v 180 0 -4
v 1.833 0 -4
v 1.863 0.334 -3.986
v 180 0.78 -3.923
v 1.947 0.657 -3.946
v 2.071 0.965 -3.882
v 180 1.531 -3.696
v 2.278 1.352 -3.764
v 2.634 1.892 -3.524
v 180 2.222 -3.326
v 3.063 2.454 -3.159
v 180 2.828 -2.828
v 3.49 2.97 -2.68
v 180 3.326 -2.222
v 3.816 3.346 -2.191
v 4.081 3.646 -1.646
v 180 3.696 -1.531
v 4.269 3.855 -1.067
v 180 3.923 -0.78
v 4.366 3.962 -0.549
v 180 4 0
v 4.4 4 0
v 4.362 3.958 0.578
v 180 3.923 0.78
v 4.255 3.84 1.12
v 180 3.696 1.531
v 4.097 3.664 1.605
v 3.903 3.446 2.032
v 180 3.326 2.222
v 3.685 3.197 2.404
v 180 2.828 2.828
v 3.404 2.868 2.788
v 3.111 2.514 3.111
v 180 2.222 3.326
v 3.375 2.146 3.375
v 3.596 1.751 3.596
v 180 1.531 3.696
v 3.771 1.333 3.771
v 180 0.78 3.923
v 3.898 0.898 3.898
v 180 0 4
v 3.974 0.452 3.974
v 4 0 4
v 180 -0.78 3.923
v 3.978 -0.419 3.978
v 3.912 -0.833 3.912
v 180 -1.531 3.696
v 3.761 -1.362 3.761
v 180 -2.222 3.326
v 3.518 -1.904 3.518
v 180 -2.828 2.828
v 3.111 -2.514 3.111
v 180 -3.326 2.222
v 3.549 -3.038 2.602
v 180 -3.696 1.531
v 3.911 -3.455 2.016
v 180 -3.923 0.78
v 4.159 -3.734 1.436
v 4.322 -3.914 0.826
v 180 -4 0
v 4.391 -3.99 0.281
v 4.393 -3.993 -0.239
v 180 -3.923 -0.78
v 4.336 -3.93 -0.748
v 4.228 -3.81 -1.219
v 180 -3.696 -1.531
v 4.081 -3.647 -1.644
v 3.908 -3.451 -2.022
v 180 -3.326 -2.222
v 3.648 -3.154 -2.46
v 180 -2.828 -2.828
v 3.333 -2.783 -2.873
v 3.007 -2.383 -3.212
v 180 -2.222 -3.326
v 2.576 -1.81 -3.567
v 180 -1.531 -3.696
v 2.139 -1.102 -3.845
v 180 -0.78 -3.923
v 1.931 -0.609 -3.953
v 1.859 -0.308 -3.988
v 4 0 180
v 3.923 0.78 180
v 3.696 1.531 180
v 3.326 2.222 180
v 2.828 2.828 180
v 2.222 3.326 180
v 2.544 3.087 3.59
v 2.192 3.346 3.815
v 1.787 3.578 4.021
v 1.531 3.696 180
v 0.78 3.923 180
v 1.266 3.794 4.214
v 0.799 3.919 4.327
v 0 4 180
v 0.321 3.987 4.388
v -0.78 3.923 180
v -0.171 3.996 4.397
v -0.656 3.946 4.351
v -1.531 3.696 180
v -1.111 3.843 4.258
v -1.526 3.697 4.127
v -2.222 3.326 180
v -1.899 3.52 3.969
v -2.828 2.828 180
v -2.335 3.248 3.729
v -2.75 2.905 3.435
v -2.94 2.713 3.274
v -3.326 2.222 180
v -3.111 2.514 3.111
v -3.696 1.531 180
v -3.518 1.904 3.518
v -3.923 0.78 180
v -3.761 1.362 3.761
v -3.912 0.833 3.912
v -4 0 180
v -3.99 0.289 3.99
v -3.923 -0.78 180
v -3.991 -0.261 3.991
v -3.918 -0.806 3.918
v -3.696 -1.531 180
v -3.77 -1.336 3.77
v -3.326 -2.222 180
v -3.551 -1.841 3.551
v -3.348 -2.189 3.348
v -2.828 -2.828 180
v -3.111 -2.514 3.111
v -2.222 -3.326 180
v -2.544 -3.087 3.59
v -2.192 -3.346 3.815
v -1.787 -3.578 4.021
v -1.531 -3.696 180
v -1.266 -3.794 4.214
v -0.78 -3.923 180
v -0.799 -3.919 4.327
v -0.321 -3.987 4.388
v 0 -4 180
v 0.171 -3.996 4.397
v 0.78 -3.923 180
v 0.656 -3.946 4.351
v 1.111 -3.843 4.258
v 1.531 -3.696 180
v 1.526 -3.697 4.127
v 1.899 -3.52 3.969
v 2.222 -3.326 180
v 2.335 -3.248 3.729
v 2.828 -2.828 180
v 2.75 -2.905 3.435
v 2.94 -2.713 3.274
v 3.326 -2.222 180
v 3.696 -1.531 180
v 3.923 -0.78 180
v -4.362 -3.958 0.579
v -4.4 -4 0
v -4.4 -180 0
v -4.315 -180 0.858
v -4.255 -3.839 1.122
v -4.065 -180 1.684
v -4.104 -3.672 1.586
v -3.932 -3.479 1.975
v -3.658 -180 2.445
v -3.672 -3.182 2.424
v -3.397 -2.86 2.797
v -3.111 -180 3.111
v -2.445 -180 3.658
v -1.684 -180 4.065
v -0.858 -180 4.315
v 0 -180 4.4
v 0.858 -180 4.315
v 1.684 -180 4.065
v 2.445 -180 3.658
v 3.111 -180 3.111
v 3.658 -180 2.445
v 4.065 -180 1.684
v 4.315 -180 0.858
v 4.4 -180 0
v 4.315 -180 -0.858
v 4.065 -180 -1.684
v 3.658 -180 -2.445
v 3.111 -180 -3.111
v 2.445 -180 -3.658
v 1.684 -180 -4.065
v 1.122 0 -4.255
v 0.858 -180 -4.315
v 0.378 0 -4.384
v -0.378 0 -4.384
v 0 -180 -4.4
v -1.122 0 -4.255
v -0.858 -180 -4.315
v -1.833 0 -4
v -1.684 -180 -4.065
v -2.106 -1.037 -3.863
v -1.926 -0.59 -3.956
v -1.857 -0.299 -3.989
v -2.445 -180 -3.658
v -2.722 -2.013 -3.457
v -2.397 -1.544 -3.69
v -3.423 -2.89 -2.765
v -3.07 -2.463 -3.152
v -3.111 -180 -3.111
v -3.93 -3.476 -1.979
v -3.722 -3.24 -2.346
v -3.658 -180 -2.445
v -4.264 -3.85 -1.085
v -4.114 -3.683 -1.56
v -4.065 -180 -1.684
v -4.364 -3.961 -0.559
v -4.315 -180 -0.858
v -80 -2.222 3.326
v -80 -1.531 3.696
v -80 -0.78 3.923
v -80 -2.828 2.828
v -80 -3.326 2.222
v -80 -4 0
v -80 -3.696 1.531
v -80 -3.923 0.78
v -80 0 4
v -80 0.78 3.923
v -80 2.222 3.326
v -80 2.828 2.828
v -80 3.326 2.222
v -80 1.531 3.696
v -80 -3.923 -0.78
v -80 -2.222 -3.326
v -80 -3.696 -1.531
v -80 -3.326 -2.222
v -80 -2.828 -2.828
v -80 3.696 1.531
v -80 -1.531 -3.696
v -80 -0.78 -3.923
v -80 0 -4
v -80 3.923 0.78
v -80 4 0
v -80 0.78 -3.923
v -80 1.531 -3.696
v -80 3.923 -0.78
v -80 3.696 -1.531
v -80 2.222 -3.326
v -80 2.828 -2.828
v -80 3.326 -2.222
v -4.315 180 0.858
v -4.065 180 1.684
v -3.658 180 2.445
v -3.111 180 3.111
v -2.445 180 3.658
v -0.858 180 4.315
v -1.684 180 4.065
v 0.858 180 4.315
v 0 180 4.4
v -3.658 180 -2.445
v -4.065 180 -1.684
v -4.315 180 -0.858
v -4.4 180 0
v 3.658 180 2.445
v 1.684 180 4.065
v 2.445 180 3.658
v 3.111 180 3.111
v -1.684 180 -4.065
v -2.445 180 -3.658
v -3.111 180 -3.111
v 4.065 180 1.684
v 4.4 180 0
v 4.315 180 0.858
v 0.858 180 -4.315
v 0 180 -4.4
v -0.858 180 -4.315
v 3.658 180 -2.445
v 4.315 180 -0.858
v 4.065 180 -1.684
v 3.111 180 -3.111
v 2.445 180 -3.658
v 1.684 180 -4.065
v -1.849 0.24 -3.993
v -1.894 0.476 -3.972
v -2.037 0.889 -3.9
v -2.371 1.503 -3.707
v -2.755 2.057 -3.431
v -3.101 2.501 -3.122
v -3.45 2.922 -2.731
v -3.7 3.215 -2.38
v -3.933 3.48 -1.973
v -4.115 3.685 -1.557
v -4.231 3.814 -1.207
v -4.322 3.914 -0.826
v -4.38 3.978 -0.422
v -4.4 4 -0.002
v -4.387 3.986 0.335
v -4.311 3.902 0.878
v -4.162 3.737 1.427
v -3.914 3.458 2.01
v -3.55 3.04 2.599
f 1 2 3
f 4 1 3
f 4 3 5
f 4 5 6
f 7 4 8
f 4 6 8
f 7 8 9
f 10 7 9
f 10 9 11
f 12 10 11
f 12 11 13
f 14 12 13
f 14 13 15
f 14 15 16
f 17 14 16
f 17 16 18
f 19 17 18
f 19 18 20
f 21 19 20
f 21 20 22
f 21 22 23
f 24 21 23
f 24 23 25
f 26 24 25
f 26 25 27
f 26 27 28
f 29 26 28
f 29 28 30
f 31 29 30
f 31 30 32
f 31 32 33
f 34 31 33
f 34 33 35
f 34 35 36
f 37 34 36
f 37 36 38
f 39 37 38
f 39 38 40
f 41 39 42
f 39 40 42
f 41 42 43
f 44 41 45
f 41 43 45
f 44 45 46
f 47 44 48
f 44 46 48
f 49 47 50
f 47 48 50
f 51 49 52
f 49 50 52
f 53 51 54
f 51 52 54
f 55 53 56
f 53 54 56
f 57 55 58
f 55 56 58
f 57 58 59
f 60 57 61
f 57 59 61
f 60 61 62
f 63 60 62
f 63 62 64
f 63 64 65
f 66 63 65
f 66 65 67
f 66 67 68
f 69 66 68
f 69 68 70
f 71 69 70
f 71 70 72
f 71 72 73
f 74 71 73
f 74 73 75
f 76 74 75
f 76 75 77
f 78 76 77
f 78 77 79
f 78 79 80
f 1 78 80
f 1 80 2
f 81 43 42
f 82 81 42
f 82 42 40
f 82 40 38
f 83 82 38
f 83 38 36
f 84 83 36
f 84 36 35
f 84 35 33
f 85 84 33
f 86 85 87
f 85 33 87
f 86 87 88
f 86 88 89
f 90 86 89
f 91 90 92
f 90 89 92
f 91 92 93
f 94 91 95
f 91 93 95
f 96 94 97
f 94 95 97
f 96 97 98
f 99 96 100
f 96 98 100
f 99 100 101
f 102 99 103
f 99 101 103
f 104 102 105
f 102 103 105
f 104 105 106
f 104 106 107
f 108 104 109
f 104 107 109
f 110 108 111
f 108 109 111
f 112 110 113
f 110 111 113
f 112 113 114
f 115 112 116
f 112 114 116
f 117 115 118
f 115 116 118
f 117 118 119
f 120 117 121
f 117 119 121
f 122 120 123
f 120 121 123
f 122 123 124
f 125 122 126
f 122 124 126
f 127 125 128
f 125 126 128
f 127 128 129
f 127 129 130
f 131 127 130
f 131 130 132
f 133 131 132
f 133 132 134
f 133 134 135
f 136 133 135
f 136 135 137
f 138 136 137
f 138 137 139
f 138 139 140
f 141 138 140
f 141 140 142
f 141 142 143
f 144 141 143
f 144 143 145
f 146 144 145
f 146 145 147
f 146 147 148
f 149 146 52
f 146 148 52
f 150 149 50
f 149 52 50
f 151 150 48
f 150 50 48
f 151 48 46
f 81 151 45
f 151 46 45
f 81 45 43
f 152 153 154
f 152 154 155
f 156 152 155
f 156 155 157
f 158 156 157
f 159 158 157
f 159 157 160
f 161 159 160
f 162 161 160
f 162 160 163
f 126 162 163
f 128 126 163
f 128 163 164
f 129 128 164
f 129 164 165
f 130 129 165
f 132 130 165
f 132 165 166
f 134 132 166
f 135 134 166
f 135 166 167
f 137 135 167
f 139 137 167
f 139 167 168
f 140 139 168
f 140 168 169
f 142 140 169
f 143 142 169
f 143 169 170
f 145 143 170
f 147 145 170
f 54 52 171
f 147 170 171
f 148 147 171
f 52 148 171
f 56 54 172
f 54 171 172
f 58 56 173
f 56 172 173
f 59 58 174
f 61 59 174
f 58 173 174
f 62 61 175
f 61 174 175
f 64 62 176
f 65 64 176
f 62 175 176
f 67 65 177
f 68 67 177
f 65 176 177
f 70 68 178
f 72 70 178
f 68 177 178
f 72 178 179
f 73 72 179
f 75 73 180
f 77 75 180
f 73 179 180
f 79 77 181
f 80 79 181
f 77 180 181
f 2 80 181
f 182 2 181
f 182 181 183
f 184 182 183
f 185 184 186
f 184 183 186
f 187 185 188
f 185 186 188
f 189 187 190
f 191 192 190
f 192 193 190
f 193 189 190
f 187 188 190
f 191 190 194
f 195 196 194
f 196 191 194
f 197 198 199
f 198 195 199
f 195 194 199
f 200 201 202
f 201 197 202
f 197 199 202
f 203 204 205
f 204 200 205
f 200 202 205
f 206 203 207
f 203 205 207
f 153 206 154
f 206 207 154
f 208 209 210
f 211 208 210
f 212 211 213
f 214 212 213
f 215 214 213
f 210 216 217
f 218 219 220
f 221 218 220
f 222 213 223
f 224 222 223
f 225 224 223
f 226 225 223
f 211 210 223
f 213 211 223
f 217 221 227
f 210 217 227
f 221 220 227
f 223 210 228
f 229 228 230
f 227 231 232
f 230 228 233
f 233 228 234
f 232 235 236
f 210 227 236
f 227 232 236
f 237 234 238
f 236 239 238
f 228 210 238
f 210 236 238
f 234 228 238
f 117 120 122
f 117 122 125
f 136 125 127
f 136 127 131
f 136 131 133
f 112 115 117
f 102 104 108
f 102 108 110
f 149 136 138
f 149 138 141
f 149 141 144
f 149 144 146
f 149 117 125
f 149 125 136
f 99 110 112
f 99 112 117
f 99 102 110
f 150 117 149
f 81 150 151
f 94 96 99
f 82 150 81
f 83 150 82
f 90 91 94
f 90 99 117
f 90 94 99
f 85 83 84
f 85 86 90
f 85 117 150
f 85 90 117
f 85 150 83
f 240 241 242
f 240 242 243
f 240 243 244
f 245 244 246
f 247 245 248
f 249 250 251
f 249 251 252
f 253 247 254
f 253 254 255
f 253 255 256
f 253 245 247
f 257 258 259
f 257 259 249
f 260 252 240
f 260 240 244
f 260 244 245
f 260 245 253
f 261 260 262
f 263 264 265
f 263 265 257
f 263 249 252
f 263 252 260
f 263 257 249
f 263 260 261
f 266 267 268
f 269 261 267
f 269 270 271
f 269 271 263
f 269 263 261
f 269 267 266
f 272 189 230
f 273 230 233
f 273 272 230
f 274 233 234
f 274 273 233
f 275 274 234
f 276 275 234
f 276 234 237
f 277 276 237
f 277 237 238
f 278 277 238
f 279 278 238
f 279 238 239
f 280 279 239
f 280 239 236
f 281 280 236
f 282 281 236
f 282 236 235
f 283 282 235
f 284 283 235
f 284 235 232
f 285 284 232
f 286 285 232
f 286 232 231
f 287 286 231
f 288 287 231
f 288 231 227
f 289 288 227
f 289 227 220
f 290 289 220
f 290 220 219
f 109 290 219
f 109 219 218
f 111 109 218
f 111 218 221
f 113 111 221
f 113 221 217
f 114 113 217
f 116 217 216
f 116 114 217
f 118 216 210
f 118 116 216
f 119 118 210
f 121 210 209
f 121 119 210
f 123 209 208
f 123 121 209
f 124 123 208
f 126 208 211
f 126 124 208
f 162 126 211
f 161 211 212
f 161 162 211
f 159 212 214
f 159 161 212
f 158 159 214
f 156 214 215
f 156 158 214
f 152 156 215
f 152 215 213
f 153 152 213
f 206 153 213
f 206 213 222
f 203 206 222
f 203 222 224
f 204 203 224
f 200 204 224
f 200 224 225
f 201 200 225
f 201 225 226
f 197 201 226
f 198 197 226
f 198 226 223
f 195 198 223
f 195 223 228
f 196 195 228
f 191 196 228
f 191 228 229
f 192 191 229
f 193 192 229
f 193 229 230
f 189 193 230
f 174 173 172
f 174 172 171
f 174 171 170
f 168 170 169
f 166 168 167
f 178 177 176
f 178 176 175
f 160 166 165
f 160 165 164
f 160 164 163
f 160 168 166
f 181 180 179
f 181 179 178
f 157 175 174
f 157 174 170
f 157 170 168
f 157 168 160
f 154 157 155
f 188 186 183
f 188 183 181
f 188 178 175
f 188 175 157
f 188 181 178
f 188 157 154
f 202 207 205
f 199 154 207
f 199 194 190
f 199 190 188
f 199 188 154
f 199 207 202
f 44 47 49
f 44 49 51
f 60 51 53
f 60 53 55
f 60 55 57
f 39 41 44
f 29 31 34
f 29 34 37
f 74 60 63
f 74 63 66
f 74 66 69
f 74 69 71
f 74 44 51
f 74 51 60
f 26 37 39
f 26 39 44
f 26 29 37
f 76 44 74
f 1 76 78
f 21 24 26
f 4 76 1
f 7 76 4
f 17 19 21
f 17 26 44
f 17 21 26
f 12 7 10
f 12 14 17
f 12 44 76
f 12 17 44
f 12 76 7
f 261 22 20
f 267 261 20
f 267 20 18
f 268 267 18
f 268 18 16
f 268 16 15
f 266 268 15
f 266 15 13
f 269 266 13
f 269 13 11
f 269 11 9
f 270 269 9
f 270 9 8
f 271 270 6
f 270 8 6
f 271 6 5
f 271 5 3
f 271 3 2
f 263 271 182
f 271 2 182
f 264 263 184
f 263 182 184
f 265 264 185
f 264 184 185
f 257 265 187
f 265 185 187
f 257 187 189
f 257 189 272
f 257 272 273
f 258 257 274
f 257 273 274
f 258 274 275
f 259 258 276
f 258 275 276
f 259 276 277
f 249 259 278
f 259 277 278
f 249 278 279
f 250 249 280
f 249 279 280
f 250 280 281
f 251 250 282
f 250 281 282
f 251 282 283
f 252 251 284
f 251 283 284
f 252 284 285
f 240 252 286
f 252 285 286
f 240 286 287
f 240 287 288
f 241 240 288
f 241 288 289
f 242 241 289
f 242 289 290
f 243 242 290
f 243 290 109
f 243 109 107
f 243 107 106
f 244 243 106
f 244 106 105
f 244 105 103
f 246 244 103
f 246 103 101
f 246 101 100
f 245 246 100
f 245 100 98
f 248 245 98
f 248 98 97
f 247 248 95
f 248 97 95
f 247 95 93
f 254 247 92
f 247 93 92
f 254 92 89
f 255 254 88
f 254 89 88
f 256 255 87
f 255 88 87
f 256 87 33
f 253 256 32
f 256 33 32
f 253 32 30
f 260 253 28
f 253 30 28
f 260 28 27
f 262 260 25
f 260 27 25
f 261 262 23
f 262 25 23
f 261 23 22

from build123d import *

# Parameters (mm, degrees)
CROQUIS1_R              = 4.4
SALIENTE_EXTRUIR1_DEPTH = 180
CROQUIS4_R              = 4.4
SALIENTE_EXTRUIR2_DEPTH = 180
CROQUIS5_R              = 4
SALIENTE_EXTRUIR3_DEPTH = 180
CROQUIS6_R              = 4
SALIENTE_EXTRUIR4_DEPTH = 80
CROQUIS7_R              = 4
SALIENTE_EXTRUIR5_DEPTH = 180


with BuildPart() as part:
    # Croquis1 → Saliente-Extruir1 (new body)
    with BuildSketch(Plane(origin=(0, 0, 0), x_dir=(1, 0, 0), z_dir=(0, 1, 0))):
        Circle(CROQUIS1_R)
    extrude(amount=SALIENTE_EXTRUIR1_DEPTH)

    # Croquis4 → Saliente-Extruir2 (add)
    with BuildSketch(Plane(origin=(0, 0, 0), x_dir=(-1, 0, 0), z_dir=(0, -1, 0))):
        Circle(CROQUIS4_R)
    extrude(amount=SALIENTE_EXTRUIR2_DEPTH)

    # Croquis5 → Saliente-Extruir3 (add)
    with BuildSketch(Plane(origin=(0, 0, 0), x_dir=(0, 0, -1), z_dir=(1, 0, 0))):
        Circle(CROQUIS5_R)
    extrude(amount=SALIENTE_EXTRUIR3_DEPTH)

    # Croquis6 → Saliente-Extruir4 (add)
    with BuildSketch(Plane(origin=(0, 0, 0), x_dir=(0, 0, -1), z_dir=(1, 0, 0))):
        Circle(CROQUIS6_R)
    extrude(amount=-SALIENTE_EXTRUIR4_DEPTH)

    # Croquis7 → Saliente-Extruir5 (add)
    with BuildSketch(Plane.XY):
        Circle(CROQUIS7_R)
    extrude(amount=SALIENTE_EXTRUIR5_DEPTH)


solid = part.part
